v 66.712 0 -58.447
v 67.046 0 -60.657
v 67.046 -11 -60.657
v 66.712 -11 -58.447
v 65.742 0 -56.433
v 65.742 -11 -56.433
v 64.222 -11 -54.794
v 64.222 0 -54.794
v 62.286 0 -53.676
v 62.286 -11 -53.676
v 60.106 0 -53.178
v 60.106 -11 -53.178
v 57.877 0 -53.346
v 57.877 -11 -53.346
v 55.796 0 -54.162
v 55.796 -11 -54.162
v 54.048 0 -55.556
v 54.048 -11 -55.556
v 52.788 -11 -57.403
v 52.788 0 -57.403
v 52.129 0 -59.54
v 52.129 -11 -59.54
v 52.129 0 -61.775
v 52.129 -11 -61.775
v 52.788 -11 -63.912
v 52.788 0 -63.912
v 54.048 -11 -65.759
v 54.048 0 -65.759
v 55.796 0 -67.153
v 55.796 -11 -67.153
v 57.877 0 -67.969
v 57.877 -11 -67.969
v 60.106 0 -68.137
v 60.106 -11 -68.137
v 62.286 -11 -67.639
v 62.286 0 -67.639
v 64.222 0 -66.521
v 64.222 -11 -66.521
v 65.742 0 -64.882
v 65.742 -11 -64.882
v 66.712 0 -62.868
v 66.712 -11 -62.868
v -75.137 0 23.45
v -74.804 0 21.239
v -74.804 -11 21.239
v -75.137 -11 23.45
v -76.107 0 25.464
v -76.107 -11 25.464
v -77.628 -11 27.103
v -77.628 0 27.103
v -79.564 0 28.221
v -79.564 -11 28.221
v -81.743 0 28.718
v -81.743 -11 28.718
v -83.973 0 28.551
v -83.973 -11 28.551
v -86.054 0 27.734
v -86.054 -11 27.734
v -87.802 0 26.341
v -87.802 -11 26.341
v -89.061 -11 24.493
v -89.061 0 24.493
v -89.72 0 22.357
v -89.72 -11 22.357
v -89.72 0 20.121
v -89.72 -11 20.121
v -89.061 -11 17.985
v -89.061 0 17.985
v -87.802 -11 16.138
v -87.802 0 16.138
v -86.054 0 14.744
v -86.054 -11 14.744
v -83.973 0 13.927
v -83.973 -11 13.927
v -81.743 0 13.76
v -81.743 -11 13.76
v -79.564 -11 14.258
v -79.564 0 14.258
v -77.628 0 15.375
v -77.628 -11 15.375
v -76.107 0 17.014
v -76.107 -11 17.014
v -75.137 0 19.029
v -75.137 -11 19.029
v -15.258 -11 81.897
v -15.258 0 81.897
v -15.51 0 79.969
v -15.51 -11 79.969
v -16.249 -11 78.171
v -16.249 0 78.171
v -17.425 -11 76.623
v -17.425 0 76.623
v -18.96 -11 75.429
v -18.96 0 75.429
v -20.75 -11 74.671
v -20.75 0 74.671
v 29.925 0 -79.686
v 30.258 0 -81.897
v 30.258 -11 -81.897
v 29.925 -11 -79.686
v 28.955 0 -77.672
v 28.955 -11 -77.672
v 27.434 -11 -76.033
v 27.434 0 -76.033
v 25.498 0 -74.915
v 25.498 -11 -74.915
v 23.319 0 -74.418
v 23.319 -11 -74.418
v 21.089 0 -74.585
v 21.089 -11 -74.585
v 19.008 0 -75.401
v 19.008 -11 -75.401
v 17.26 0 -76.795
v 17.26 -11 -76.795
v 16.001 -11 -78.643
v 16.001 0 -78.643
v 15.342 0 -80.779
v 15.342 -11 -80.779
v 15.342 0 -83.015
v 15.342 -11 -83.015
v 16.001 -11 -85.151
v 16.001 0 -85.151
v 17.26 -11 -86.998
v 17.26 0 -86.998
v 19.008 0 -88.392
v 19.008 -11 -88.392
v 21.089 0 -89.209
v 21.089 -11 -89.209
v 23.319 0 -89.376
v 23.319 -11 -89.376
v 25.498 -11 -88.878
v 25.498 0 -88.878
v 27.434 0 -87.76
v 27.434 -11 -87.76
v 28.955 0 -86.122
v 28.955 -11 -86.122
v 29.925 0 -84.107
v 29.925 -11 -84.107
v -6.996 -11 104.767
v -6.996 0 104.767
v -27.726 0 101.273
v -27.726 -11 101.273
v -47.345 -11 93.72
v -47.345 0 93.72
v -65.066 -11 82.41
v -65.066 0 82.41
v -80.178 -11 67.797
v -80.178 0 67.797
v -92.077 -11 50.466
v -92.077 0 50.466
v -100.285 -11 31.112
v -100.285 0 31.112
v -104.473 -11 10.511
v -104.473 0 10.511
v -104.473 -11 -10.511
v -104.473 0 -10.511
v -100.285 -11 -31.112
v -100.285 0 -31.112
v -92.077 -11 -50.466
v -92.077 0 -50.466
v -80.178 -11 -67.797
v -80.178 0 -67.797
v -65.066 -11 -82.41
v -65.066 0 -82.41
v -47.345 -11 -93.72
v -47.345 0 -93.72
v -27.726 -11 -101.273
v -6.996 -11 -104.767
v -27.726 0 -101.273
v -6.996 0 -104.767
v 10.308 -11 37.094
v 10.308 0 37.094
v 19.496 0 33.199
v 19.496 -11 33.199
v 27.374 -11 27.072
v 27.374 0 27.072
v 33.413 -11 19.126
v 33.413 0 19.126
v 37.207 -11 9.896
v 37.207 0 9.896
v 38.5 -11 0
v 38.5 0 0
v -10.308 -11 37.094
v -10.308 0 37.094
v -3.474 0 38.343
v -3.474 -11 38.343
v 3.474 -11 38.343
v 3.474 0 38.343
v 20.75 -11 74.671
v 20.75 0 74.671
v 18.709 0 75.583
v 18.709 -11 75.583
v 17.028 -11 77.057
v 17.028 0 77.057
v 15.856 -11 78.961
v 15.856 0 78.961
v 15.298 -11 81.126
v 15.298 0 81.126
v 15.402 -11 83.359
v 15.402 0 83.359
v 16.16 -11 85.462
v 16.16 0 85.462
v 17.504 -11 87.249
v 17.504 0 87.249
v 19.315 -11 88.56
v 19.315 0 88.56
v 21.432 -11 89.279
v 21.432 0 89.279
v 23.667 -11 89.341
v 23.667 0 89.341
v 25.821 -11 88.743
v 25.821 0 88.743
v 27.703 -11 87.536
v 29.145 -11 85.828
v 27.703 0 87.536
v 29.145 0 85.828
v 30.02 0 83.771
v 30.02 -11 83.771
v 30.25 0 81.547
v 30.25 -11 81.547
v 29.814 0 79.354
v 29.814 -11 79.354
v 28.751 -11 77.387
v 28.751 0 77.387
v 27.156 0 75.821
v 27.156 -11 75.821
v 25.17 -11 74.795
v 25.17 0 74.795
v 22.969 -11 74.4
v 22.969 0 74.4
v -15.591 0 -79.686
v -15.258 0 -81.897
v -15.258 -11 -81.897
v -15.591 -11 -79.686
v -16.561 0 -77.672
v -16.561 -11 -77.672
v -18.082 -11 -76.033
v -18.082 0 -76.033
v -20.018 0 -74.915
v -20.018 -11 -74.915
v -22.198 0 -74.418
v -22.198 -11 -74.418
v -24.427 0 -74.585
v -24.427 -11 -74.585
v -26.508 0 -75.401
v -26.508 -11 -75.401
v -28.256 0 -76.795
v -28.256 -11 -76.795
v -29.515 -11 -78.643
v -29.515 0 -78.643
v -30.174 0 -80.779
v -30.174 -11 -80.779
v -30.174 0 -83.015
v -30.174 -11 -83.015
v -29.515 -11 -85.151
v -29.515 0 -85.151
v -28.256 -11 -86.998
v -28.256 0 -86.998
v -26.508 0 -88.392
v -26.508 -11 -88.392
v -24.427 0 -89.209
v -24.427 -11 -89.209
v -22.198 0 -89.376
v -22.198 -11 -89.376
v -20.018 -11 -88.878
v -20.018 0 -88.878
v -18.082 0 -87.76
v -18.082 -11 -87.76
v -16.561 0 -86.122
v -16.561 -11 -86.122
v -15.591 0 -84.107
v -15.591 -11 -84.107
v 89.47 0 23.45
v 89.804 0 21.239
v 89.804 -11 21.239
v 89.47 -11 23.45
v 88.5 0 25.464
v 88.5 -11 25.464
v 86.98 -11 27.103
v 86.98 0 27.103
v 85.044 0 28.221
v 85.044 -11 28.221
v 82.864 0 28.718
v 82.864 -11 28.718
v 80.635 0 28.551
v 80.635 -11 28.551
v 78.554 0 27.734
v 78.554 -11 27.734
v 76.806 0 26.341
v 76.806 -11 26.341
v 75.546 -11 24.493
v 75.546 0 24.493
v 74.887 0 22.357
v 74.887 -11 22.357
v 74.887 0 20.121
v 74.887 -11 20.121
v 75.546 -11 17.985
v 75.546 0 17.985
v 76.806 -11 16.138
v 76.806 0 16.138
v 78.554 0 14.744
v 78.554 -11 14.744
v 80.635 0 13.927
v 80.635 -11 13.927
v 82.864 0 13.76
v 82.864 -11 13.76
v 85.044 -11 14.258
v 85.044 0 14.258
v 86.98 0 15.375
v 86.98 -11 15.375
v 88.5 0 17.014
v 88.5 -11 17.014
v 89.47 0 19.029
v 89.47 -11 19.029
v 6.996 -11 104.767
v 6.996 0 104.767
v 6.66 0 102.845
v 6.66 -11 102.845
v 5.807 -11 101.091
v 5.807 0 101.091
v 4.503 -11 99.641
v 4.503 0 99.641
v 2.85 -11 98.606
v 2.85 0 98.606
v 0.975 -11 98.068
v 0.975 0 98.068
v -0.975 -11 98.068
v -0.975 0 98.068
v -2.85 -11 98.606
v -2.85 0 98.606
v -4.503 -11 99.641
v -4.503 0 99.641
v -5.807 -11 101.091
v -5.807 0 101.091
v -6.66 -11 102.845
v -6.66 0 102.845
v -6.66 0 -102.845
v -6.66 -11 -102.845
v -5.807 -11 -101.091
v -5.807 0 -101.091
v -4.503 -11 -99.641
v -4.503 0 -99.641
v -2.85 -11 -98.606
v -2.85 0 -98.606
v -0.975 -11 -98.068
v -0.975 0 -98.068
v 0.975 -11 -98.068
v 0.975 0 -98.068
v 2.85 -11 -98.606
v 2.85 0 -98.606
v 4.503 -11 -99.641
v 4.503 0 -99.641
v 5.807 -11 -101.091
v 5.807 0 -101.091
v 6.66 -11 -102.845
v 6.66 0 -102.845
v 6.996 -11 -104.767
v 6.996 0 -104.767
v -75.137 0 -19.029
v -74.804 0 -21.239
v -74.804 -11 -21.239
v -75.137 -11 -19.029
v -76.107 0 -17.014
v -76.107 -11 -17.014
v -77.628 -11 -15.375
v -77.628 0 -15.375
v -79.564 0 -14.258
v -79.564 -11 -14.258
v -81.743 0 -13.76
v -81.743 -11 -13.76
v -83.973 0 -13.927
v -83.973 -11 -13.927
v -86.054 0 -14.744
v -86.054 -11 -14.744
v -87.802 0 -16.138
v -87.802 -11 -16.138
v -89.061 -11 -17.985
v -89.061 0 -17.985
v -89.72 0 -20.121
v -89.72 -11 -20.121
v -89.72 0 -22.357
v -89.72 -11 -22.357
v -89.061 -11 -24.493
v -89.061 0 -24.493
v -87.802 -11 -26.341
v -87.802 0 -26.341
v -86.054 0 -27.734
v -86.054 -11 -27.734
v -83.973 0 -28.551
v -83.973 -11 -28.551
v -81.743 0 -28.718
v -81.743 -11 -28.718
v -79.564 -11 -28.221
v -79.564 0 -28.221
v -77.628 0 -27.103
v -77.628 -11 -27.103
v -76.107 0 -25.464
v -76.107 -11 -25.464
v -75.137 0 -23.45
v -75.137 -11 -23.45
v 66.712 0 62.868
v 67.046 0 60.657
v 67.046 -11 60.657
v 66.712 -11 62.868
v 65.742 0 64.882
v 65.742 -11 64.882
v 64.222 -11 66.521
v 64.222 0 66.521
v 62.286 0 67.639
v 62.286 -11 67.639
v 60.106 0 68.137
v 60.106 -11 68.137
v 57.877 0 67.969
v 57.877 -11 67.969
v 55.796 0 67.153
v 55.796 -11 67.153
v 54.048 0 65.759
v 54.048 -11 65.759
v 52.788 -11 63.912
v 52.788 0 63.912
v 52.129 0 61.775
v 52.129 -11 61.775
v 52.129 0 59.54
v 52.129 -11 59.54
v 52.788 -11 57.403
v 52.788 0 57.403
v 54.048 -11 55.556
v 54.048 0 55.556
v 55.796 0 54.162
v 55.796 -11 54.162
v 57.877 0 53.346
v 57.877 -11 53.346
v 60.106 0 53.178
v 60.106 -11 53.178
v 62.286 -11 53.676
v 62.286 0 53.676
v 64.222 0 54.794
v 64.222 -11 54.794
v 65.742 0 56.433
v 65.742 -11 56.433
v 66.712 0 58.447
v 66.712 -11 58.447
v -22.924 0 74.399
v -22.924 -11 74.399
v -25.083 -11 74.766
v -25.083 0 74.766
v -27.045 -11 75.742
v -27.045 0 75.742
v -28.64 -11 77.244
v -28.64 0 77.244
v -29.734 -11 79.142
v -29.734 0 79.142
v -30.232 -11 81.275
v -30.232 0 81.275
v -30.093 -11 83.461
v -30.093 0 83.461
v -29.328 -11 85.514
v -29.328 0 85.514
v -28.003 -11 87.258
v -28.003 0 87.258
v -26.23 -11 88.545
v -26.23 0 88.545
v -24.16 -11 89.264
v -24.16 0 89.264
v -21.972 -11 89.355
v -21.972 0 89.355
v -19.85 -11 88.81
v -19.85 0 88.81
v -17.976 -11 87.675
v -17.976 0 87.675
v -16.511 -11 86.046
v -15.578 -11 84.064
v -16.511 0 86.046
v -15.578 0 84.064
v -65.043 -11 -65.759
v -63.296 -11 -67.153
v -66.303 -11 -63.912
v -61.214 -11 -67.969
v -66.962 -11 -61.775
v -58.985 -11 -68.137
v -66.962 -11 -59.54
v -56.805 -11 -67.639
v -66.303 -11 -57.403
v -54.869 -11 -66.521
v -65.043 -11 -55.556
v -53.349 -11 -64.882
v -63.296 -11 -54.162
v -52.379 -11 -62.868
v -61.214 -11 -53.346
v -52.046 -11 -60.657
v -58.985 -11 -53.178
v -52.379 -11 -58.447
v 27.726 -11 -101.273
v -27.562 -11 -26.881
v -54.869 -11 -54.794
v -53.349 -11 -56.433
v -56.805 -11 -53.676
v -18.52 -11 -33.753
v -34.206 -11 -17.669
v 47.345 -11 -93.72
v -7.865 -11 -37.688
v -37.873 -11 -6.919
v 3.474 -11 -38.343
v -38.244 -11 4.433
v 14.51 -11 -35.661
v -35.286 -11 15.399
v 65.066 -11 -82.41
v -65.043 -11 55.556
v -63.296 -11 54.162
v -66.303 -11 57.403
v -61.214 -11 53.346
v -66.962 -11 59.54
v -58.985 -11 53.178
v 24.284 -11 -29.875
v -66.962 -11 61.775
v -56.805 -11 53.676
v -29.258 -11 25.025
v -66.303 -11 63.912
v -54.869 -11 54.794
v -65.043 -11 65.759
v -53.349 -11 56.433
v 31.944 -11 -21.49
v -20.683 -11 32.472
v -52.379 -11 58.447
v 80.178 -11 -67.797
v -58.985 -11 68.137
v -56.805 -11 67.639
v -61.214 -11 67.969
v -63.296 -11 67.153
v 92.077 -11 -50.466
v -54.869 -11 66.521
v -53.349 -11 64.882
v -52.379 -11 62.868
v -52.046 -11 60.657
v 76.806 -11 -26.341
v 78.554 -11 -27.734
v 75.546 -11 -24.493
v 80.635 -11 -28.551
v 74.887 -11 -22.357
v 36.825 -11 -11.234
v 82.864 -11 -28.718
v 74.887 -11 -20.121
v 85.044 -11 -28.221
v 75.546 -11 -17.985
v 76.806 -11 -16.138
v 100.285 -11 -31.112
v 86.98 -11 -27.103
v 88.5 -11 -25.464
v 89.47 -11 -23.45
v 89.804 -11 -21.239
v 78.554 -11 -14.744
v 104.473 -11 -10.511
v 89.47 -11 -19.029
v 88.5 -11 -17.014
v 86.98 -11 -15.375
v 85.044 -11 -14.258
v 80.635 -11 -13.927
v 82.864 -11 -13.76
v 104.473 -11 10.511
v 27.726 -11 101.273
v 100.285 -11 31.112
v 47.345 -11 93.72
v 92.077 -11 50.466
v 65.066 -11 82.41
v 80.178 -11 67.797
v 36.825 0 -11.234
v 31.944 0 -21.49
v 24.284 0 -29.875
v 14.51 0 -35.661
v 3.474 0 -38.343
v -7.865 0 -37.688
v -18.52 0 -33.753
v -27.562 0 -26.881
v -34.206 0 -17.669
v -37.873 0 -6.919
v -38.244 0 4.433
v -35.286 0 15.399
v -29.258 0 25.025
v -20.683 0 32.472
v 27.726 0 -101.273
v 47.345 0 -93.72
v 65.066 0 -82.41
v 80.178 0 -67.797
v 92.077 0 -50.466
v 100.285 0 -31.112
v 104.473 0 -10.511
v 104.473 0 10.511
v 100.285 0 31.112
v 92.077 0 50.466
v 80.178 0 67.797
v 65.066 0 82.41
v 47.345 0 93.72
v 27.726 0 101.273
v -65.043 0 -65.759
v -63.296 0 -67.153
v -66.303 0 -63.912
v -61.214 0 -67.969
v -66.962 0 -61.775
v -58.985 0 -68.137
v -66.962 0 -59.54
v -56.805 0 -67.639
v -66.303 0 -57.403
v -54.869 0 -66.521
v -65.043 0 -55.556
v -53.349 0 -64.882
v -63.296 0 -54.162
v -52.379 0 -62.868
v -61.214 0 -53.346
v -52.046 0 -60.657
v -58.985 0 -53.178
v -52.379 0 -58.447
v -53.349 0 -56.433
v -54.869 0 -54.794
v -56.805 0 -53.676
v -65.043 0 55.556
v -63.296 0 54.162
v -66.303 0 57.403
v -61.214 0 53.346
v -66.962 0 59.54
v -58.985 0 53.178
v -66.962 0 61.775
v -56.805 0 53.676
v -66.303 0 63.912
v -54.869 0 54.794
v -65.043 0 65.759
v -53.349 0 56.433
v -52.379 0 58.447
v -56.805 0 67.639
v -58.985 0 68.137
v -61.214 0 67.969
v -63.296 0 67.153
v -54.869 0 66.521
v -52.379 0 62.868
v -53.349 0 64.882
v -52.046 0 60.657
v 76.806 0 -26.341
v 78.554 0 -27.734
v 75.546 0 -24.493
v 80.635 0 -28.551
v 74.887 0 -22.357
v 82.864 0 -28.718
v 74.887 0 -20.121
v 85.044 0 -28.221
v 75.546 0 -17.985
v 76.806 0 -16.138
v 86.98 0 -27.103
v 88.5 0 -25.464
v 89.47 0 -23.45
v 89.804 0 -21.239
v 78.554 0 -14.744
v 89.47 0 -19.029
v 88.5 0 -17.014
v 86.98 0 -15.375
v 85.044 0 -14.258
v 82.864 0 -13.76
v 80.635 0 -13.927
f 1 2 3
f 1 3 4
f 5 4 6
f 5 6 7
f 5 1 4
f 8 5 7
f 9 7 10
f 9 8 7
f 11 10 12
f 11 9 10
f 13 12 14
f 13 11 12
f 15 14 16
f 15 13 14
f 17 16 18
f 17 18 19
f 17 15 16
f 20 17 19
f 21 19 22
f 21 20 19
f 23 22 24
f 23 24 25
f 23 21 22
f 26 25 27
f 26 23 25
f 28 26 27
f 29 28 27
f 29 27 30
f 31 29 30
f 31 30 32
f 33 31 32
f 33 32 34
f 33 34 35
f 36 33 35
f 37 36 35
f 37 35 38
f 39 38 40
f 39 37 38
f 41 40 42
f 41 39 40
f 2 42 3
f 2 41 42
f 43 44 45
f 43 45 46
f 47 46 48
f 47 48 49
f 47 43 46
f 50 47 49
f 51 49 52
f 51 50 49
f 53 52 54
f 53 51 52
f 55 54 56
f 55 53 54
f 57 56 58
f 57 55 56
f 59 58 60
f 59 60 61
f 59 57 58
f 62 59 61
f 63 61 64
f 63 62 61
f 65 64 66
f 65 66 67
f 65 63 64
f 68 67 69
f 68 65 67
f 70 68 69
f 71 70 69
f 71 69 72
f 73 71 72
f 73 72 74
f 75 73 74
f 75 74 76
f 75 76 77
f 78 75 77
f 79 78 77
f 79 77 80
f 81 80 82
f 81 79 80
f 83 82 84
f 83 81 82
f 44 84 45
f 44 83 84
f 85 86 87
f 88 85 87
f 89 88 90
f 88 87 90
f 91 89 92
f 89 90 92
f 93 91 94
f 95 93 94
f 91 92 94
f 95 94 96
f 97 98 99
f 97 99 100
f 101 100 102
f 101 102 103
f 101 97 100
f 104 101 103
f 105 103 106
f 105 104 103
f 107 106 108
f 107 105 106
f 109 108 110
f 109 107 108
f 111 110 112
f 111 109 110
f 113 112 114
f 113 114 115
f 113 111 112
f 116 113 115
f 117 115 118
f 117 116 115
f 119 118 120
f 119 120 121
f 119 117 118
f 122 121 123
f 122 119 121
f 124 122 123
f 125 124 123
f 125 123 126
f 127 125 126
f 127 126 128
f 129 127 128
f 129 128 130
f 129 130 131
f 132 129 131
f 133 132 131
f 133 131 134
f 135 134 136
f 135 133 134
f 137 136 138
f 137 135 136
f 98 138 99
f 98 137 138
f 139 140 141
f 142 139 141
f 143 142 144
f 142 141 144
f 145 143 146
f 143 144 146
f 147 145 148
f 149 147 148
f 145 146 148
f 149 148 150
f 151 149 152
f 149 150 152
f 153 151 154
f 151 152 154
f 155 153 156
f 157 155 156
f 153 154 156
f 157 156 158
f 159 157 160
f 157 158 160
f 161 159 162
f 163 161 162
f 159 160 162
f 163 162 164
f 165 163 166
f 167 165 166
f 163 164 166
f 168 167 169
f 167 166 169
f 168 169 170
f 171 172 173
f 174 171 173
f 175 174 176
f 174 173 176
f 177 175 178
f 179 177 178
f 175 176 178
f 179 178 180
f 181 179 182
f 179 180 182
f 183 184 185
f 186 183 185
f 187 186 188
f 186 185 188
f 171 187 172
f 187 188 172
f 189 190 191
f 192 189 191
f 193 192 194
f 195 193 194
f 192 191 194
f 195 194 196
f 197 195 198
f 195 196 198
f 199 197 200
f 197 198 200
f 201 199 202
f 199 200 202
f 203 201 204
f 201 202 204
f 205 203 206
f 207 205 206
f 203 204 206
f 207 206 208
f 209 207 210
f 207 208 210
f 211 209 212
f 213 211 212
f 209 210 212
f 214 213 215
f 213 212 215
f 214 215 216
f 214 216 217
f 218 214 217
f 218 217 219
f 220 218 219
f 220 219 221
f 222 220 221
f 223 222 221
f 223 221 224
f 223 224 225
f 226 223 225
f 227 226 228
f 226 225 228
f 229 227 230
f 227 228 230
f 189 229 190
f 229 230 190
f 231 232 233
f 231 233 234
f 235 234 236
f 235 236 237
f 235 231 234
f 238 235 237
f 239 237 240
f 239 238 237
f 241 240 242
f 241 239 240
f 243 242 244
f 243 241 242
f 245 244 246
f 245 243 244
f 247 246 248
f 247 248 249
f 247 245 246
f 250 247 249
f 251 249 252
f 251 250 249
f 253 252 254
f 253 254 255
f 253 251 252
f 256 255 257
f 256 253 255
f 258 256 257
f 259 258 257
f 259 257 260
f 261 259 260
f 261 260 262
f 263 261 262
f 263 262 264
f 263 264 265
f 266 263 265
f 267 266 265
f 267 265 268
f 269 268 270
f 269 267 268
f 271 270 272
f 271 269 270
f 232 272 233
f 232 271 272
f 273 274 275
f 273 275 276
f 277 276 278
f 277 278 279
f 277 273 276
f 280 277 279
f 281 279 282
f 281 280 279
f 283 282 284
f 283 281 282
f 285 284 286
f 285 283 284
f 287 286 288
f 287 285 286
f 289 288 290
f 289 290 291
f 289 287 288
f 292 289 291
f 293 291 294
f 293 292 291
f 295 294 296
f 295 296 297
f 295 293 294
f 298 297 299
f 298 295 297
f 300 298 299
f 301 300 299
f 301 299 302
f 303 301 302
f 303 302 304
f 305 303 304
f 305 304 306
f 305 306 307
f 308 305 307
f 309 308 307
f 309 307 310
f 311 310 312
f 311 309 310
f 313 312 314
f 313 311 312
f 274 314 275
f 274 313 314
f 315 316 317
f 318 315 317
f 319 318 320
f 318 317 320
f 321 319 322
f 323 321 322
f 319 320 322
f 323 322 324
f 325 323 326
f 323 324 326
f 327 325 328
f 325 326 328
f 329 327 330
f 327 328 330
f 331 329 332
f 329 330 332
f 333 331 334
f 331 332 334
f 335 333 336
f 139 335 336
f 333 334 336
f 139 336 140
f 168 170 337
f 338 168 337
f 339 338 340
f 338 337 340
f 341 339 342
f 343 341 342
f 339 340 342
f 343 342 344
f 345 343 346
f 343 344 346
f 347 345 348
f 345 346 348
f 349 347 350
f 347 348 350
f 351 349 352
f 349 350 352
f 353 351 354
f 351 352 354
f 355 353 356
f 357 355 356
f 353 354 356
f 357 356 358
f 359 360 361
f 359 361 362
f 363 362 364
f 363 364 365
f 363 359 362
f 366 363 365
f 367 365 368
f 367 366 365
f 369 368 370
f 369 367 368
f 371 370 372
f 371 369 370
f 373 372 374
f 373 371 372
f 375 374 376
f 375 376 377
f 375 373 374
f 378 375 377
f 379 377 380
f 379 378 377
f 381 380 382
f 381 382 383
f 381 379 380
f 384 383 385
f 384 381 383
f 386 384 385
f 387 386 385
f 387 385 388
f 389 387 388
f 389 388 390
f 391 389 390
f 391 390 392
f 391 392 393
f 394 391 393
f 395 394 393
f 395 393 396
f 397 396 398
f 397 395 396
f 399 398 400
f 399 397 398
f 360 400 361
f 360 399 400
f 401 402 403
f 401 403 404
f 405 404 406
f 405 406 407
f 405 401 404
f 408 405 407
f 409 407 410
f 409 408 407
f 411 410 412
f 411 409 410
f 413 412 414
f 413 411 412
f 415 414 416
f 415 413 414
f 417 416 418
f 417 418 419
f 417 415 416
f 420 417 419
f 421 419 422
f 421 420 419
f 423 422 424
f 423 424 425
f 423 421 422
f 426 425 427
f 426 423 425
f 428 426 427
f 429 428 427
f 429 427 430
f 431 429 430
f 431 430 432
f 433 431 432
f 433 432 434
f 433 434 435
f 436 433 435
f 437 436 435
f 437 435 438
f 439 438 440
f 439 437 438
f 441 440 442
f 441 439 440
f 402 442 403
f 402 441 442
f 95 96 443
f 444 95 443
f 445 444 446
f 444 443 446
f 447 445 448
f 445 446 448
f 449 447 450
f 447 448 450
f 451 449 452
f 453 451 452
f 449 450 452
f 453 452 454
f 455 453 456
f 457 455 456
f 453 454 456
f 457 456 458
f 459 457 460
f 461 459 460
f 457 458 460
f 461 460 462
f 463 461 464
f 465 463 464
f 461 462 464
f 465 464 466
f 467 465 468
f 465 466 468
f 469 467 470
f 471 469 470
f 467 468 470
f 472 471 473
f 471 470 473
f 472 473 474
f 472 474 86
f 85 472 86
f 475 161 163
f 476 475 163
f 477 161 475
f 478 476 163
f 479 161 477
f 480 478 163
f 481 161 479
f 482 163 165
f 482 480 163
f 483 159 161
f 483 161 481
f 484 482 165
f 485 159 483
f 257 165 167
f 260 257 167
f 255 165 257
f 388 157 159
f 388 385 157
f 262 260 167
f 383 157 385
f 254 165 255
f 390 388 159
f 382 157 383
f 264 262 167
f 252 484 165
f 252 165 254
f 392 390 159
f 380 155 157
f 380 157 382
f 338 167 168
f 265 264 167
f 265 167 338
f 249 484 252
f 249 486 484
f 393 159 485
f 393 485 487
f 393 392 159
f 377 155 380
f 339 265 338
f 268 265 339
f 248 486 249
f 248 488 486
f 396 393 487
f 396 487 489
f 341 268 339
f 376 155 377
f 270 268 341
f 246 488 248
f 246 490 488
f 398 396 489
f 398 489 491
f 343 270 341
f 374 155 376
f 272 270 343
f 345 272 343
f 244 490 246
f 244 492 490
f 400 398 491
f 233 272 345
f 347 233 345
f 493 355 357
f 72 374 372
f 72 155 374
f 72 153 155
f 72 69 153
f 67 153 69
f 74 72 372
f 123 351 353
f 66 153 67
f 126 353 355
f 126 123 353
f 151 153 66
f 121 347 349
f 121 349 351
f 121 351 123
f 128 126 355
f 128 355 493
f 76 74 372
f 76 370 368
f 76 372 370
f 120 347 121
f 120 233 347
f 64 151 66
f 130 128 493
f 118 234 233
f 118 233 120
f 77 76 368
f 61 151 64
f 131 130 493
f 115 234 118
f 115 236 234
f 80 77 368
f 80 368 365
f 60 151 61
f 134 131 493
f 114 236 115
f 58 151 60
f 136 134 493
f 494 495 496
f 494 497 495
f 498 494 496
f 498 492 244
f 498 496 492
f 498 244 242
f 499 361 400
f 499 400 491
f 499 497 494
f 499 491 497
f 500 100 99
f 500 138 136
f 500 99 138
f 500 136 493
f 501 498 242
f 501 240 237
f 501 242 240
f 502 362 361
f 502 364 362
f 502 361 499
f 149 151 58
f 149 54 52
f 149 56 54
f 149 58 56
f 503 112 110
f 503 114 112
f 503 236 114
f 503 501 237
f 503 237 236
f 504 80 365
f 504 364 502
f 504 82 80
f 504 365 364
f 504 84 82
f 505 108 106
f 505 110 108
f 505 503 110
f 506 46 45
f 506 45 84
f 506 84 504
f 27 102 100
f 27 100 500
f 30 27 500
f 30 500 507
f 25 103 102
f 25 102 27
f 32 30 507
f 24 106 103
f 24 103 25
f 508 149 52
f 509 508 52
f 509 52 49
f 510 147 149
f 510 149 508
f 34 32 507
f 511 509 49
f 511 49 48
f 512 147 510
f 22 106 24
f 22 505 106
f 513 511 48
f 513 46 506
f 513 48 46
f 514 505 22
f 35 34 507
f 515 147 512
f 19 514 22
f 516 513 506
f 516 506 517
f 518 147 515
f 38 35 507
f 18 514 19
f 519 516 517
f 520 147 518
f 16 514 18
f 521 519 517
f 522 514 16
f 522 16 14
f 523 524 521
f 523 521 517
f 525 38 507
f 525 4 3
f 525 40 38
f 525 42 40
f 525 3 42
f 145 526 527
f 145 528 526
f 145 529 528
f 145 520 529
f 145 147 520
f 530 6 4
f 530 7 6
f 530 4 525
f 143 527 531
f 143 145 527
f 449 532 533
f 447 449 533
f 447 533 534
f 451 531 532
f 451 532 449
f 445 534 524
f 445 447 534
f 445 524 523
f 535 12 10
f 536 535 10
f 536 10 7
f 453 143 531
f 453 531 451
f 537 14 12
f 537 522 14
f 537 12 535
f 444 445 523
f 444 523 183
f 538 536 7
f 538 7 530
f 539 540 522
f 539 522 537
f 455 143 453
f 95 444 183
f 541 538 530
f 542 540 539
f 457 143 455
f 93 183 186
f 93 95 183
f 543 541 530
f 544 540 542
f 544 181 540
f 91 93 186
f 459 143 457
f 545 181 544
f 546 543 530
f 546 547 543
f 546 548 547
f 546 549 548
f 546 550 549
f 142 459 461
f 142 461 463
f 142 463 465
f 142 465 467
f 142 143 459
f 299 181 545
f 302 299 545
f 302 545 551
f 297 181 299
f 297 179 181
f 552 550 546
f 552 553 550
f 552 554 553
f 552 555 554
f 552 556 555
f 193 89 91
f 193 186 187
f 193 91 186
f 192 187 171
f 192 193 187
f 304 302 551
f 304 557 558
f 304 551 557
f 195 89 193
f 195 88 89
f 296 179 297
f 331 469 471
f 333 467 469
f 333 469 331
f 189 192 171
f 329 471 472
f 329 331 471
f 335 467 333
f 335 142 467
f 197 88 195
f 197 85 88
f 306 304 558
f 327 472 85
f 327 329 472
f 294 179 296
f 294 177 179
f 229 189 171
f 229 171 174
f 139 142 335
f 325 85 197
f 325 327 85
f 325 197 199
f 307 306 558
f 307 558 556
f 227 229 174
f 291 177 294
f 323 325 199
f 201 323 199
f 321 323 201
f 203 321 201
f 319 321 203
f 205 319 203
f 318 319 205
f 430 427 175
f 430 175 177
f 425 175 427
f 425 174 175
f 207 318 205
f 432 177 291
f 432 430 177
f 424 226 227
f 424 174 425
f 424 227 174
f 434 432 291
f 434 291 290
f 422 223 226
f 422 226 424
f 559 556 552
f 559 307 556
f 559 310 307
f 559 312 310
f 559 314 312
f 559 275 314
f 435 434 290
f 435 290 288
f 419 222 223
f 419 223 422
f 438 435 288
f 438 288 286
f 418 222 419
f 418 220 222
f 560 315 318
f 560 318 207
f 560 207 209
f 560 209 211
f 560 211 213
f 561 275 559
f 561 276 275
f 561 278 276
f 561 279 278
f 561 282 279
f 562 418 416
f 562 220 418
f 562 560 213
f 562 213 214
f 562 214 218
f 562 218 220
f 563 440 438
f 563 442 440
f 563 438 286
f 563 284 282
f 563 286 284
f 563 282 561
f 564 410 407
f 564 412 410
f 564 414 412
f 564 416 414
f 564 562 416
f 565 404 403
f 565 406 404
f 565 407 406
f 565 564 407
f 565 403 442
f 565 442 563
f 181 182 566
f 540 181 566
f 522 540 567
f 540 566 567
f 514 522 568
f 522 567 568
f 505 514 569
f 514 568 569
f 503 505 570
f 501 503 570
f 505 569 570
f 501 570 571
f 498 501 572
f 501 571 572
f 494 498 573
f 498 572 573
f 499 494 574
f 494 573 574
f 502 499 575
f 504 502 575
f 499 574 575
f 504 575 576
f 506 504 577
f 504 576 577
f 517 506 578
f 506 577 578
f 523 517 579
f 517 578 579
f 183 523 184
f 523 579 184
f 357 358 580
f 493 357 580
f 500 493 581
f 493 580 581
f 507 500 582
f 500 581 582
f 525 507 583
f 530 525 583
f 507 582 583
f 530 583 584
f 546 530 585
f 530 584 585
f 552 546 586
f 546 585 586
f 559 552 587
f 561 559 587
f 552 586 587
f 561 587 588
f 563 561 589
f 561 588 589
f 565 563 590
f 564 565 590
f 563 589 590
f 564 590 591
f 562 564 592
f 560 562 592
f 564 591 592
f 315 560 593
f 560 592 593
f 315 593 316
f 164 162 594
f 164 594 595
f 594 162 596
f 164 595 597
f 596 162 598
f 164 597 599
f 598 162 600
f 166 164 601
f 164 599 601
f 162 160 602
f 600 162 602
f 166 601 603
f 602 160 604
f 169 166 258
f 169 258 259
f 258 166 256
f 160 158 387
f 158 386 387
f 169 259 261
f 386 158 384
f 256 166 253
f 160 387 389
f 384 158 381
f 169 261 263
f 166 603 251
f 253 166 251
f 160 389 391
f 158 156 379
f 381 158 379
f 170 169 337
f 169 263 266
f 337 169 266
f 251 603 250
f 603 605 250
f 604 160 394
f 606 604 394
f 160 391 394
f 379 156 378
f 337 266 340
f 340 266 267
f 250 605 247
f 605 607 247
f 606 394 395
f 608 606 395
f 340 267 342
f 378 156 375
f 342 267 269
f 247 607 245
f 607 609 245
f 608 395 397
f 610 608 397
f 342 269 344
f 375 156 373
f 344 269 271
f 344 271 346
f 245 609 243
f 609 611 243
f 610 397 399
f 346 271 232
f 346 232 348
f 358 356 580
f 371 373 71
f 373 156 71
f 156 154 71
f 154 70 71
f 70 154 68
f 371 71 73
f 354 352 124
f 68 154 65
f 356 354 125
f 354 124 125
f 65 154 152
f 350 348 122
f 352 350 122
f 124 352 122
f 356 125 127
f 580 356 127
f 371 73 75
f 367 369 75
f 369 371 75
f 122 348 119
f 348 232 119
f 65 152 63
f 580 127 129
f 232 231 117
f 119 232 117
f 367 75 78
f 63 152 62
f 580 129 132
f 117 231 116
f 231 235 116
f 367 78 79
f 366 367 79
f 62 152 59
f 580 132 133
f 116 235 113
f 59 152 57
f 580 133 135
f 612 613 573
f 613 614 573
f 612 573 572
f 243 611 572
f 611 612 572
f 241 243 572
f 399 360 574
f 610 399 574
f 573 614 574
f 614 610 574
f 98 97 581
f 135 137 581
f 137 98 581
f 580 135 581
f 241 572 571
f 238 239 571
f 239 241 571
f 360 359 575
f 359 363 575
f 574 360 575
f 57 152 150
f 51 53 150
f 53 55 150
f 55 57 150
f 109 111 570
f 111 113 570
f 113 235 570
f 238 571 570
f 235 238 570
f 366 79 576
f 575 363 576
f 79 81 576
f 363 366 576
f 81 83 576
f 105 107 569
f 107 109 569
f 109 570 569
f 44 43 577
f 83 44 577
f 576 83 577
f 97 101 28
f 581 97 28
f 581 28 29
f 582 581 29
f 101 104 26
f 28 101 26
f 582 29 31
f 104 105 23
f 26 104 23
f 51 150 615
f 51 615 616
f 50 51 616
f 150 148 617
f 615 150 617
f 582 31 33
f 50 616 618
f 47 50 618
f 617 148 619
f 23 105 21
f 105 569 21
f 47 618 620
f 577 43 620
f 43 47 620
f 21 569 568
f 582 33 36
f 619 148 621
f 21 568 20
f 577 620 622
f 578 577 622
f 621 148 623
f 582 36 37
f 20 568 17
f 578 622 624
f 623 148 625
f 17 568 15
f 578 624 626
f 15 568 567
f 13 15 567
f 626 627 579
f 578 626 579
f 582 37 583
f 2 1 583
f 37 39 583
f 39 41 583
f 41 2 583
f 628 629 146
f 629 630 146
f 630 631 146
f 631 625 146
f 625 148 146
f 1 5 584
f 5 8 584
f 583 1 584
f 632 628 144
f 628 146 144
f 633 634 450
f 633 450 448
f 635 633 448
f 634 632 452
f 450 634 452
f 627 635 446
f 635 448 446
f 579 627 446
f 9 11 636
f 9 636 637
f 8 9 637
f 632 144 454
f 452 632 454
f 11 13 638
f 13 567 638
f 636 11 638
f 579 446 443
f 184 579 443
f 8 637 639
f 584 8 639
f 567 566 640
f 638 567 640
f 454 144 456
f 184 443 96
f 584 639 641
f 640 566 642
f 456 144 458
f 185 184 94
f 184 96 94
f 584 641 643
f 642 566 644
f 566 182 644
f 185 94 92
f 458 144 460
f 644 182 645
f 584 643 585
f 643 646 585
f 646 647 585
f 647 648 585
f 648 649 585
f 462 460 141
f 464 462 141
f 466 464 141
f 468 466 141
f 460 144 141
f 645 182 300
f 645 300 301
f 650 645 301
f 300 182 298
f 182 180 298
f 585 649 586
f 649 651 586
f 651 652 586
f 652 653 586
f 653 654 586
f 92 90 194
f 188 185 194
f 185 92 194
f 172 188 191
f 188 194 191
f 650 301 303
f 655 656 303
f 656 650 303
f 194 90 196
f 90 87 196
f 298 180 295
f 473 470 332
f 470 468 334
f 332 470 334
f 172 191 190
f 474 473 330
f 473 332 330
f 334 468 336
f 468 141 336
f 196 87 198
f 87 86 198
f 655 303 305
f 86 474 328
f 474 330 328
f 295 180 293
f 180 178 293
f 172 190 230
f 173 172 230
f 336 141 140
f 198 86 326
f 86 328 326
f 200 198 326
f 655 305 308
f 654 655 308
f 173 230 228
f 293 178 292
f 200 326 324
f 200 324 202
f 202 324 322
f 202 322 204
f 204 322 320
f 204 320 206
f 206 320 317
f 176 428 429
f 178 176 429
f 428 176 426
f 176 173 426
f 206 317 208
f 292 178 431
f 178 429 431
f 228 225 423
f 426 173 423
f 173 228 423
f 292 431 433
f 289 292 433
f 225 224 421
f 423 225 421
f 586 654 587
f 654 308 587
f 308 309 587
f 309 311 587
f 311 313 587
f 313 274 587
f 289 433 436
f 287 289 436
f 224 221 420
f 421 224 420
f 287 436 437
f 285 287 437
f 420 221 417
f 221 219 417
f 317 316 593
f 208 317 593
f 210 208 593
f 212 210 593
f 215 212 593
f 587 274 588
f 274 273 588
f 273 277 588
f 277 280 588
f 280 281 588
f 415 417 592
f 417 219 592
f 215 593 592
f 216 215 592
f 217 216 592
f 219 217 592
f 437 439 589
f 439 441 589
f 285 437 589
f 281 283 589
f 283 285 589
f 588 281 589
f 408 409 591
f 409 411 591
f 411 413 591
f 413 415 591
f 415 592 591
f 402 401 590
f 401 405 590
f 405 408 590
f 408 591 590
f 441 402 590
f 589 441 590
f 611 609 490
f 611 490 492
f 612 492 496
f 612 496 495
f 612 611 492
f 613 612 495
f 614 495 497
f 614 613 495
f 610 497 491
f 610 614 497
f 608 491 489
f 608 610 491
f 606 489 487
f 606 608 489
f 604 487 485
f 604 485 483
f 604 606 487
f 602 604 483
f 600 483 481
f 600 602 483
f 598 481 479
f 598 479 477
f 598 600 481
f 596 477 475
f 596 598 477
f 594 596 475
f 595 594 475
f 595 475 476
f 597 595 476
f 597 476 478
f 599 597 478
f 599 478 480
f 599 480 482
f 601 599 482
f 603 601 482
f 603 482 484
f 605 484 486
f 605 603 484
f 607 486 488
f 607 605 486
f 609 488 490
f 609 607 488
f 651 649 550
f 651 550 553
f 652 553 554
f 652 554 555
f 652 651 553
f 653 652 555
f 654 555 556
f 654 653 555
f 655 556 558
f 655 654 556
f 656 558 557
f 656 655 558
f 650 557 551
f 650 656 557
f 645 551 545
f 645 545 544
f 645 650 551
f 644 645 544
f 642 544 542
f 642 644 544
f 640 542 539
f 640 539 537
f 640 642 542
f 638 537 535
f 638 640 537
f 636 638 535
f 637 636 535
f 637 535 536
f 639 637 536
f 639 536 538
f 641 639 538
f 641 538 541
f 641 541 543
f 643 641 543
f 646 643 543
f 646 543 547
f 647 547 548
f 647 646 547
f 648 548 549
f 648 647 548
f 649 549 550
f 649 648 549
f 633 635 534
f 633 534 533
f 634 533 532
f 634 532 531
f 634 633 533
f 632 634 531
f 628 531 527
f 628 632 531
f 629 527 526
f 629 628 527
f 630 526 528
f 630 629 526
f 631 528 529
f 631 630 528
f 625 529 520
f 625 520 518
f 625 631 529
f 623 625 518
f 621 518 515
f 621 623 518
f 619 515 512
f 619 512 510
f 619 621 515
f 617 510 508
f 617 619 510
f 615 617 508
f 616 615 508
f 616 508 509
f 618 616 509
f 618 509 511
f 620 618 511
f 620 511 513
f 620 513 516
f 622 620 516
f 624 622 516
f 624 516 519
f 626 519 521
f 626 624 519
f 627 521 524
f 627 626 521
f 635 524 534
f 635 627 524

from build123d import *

# Parameters (mm, degrees)
F0_R     = 7.5
F1_DEPTH = 11


# Not quite as in the source:
# - a feature of the source that left no trace in its solid (it failed there, or was rolled back) is left out


with BuildPart() as f1:
    # F0 (on Front) → F1 (new body)
    with BuildSketch(Plane.XZ):
        with BuildLine():
            ThreePointArc((6.9961100303, 104.7666666667), (0, 98), (-6.9961100303, 104.7666666667))
            ThreePointArc((-6.9961100303, 104.7666666667), (-105, 0), (-6.9961100303, -104.7666666667))
            ThreePointArc((-6.9961100303, -104.7666666667), (0, -98), (6.9961100303, -104.7666666667))
            ThreePointArc((6.9961100303, -104.7666666667), (105, 0), (6.9961100303, 104.7666666667))
        make_face()
        with Locations((-59.54553545, -60.6574744609)):
            Circle(F0_R, mode=Mode.SUBTRACT)
        with Locations((-22.7581460876, -81.8966836121)):
            Circle(F0_R, mode=Mode.SUBTRACT)
        with Locations((-82.3036815375, -21.2392091511)):
            Circle(F0_R, mode=Mode.SUBTRACT)
        with Locations((22.7581460876, -81.8966836121)):
            Circle(F0_R, mode=Mode.SUBTRACT)
        with Locations((59.54553545, -60.6574744609)):
            Circle(F0_R, mode=Mode.SUBTRACT)
        with Locations((82.3036815375, -21.2392091511)):
            Circle(F0_R, mode=Mode.SUBTRACT)
        with Locations((-82.3036815375, 21.2392091511)):
            Circle(F0_R, mode=Mode.SUBTRACT)
        with Locations((-59.54553545, 60.6574744609)):
            Circle(F0_R, mode=Mode.SUBTRACT)
        with BuildLine():
            ThreePointArc((-15.2581460876, 81.8966836121), (-16.7869427812, 77.3585418036), (-20.750074374, 74.6705056463))
            ThreePointArc((-20.750074374, 74.6705056463), (-28.729349394, 86.4348254206), (-15.2581460876, 81.8966836121))
        make_face(mode=Mode.SUBTRACT)
        with BuildLine():
            ThreePointArc((10.3081014632, 37.0943802243), (30.6521769727, 23.2957946169), (38.5, 0))
            ThreePointArc((38.5, 0), (-23.2957946169, -30.6521769727), (-10.3081014632, 37.0943802243))
            ThreePointArc((-10.3081014632, 37.0943802243), (0, 38.5), (10.3081014632, 37.0943802243))
        make_face(mode=Mode.SUBTRACT)
        with Locations((82.3036815375, 21.2392091511)):
            Circle(F0_R, mode=Mode.SUBTRACT)
        with BuildLine():
            ThreePointArc((30.2581460876, 81.8966836121), (27.2962878961, 75.9254803057), (20.750074374, 74.6705056463))
            ThreePointArc((20.750074374, 74.6705056463), (18.2200042791, 87.8678869184), (30.2581460876, 81.8966836121))
        make_face(mode=Mode.SUBTRACT)
        with Locations((59.54553545, 60.6574744609)):
            Circle(F0_R, mode=Mode.SUBTRACT)
    extrude(amount=F1_DEPTH)


solid = f1.part
